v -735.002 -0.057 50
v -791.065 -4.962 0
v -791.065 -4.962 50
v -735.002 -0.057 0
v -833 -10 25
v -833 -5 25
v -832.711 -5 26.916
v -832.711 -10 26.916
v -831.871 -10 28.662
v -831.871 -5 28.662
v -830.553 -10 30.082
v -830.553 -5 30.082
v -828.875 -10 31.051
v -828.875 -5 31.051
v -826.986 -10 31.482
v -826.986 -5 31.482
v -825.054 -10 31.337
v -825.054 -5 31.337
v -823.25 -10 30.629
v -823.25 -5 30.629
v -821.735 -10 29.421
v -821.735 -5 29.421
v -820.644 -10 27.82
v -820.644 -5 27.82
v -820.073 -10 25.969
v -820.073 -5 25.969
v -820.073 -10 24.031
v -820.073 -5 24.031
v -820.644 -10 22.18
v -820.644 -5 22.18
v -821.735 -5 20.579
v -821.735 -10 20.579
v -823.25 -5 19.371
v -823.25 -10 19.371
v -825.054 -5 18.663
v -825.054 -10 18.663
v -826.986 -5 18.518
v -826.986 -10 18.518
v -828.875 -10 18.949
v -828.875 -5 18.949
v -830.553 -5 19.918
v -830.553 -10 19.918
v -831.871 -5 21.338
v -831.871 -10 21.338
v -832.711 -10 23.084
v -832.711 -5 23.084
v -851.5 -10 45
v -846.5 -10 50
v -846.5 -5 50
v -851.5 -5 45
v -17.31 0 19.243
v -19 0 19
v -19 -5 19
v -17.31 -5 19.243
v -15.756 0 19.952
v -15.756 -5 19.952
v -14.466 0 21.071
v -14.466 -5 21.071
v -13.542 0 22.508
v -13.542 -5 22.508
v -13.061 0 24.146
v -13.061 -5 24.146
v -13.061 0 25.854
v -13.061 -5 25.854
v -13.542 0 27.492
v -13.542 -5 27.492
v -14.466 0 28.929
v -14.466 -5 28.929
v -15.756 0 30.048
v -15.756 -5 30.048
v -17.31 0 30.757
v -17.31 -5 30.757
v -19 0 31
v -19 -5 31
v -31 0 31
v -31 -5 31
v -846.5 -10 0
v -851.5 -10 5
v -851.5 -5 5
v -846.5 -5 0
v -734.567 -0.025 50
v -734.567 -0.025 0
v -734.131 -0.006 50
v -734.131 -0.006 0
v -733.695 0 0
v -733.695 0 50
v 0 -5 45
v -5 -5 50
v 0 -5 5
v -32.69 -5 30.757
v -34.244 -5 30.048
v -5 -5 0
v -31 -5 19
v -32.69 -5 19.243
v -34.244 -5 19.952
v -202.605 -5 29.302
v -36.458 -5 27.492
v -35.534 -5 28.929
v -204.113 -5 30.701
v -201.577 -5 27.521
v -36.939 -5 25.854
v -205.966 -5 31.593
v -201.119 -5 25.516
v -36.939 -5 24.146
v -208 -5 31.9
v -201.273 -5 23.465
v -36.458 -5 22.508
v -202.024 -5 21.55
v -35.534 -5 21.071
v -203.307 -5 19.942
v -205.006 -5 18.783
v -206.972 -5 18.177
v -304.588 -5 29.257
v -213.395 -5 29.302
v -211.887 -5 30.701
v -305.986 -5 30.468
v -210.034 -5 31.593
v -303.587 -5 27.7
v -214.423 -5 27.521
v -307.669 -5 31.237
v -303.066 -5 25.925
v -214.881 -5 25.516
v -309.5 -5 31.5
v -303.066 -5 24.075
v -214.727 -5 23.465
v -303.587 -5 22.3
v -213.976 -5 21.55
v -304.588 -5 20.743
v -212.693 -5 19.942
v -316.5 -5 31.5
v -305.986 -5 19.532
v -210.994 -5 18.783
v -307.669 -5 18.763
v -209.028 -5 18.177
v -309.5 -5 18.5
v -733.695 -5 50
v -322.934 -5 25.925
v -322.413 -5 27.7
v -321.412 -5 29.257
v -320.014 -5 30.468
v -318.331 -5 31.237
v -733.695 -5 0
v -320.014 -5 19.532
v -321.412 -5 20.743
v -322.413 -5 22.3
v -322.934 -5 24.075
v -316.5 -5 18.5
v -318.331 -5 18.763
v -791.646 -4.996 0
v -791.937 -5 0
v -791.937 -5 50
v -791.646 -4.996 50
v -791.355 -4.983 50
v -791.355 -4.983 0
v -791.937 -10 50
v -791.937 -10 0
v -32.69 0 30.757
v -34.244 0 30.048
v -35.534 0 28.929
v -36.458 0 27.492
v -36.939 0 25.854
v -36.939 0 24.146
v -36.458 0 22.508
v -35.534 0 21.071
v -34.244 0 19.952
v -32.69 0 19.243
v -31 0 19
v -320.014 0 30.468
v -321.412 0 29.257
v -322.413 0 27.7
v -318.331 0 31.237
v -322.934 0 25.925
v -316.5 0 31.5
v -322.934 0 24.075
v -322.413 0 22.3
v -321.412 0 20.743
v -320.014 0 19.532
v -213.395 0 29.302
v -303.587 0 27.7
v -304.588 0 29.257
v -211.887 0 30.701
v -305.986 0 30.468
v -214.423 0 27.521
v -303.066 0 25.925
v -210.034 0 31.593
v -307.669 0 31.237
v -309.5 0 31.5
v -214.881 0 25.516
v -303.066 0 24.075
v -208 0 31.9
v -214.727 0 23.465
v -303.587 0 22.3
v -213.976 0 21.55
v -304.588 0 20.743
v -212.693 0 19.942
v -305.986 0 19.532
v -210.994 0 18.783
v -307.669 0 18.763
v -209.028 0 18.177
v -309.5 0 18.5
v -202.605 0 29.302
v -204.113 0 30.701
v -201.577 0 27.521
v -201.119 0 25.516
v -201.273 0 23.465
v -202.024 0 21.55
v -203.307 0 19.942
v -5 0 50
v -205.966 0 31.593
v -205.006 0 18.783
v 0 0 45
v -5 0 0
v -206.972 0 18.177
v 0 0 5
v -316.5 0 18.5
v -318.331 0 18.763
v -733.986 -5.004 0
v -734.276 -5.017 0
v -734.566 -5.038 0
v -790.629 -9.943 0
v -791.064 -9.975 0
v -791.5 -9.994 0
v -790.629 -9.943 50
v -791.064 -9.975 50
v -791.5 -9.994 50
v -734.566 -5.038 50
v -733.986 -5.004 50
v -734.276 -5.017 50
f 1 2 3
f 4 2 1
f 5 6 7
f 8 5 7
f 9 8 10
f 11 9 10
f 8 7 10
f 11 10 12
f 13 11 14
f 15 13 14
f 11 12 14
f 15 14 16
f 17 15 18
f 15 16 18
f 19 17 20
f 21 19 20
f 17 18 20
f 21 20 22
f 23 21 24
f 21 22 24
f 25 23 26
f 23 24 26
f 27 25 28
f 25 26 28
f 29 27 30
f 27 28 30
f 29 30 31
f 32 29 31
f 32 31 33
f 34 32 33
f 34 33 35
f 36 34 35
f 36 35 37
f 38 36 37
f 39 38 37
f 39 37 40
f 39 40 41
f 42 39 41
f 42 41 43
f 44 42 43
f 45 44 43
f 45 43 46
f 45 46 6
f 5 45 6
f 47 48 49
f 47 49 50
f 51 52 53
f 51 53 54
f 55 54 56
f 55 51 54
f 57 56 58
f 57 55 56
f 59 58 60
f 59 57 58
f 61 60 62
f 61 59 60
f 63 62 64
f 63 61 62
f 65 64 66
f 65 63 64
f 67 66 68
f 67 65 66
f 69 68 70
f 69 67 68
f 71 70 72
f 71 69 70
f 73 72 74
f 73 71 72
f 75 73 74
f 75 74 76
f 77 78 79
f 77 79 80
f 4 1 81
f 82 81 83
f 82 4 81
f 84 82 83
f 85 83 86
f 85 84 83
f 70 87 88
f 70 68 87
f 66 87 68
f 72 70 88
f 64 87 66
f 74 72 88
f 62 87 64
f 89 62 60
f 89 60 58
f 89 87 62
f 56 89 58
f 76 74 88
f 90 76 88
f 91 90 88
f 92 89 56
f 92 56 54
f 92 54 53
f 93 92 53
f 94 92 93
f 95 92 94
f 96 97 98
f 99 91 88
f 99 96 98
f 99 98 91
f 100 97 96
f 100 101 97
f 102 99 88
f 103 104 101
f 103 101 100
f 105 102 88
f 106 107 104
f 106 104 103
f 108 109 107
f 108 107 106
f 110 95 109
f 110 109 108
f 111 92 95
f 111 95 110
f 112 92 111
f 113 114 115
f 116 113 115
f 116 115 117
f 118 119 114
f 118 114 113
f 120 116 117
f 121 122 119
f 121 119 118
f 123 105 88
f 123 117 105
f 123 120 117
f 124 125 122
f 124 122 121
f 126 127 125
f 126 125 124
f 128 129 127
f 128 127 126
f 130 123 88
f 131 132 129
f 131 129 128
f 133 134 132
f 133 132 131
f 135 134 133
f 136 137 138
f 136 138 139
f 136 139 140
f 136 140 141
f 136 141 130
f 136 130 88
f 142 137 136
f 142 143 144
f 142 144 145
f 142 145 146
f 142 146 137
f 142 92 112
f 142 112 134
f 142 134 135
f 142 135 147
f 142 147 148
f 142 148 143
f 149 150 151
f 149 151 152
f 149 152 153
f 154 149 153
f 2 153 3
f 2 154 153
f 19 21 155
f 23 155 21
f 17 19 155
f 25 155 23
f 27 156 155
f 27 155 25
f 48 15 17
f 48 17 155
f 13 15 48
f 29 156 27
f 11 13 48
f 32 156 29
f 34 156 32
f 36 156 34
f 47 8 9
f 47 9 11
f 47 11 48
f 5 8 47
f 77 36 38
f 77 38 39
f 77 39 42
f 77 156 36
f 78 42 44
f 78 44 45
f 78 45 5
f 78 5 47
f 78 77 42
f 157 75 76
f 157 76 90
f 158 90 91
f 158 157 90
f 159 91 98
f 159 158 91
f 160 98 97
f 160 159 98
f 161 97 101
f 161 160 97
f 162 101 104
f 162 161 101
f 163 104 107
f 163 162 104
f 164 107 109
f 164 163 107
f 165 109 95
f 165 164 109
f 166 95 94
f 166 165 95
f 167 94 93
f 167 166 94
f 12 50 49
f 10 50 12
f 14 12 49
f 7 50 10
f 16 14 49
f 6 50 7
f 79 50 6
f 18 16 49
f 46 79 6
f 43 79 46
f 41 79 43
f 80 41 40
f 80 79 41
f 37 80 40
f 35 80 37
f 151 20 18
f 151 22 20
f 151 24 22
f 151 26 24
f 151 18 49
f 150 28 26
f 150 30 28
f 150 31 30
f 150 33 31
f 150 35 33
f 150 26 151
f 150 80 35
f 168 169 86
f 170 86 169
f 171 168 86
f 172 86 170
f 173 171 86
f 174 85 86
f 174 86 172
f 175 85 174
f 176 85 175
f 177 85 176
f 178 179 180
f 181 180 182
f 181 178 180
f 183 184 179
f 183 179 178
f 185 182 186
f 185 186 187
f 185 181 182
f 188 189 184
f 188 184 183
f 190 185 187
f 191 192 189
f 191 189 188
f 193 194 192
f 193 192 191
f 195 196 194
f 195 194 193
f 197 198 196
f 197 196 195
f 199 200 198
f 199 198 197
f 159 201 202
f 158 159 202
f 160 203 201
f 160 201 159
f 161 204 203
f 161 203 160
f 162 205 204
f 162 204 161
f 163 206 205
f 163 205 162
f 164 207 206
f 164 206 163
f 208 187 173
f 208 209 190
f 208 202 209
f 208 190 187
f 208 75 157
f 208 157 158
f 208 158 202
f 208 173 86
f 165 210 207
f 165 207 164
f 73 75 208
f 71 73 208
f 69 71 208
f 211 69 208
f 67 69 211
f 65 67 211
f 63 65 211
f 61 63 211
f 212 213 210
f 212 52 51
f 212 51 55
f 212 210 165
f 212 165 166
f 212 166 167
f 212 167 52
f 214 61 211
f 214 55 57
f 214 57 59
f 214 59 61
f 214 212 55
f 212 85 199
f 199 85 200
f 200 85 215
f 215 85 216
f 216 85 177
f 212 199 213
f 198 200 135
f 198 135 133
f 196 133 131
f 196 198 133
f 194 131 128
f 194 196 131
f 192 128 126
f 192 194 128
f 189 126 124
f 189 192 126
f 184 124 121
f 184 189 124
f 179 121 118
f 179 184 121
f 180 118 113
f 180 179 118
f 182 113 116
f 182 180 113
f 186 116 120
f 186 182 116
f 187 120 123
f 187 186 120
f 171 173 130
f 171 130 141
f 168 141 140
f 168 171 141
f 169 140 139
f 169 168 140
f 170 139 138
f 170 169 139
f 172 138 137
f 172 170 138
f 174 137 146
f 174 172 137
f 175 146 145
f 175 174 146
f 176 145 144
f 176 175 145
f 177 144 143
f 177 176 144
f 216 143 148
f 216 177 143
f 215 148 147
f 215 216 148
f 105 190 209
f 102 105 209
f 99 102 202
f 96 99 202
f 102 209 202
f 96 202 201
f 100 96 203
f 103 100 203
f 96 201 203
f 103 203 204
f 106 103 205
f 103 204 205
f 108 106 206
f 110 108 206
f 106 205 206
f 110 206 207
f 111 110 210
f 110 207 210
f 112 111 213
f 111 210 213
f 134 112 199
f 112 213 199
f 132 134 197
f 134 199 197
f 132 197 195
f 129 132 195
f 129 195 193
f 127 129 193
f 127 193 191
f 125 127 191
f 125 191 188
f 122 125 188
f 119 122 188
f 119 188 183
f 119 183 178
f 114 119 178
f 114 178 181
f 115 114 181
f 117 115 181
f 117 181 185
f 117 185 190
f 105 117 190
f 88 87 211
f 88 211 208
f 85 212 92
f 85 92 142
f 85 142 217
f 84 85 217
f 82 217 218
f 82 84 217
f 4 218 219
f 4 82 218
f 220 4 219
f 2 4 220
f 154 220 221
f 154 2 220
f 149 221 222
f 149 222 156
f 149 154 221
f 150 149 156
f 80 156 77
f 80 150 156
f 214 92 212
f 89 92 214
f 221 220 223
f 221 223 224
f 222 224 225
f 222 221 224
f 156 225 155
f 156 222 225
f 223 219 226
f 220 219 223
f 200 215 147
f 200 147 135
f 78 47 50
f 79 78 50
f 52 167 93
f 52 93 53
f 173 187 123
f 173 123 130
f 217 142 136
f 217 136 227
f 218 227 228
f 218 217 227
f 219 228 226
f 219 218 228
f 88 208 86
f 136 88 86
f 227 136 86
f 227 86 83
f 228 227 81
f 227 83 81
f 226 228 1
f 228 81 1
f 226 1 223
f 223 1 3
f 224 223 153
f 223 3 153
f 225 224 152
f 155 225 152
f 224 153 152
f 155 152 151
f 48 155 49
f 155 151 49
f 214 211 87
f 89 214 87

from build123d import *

# Parameters (mm, degrees)
SM_BASE_FLANGE_1_DEPTH = 50
SKETCH_4_R             = 6.9
CUT_EXTRUDE_3_DEPTH    = 10
SKETCH_5_R             = 6.5
CUT_EXTRUDE_4_DEPTH    = 10
OTHER_START            = -10
OTHER_1_DEPTH          = 10
CUT_EXTRUDE_5_DEPTH    = 10


# Read off the part's stored shape, not the designer's step: Затупленный угол1
# Sheet-metal steps are written as plain solids
with BuildPart() as part:
    # Sketch 1 → Базовая кромка1 (new body)
    with BuildSketch(Plane.XY):
        with BuildLine():
            Line((-851.5, -5), (-791.936609429, -5))
            ThreePointArc((-791.936609429, -5), (-791.500415555, -4.990482216), (-791.065052002, -4.961946981))
            Line((-791.065052002, -4.961946981), (-735.002160484, -0.057079529))
            ThreePointArc((-735.002160484, -0.057079529), (-734.349115153, -0.014276676), (-733.694824343, 0))
            Line((-733.694824343, 0), (0, 0))
            Line((0, 0), (0, -5))
            Line((0, -5), (-733.694824343, -5))
            ThreePointArc((-733.694824343, -5), (-734.131018216, -5.009517784), (-734.56638177, -5.038053019))
            Line((-734.56638177, -5.038053019), (-790.629273288, -9.942920471))
            ThreePointArc((-790.629273288, -9.942920471), (-791.282318619, -9.985723324), (-791.936609429, -10))
            Line((-791.936609429, -10), (-851.5, -10))
            Line((-851.5, -10), (-851.5, -5))
        make_face()
    extrude(amount=SM_BASE_FLANGE_1_DEPTH)

    # Эскиз4 → Вырез-Вытянуть3 (cut)
    with BuildSketch(Plane(origin=(0, 0, 0), x_dir=(1, 0, 0), z_dir=(0, 1, 0))):
        with Locations(Location((-208, -25, 0), (0, 0, 270))):
            Circle(SKETCH_4_R)
        with BuildLine():
            Line((-309.5, -31.5), (-316.5, -31.5))
            ThreePointArc((-316.5, -31.5), (-323, -25), (-316.5, -18.5))
            Line((-316.5, -18.5), (-309.5, -18.5))
            ThreePointArc((-309.5, -18.5), (-303, -25), (-309.5, -31.5))
        make_face()
    extrude(amount=-CUT_EXTRUDE_3_DEPTH, mode=Mode.SUBTRACT)

    # Эскиз5 → Вырез-Вытянуть4 (cut)
    with BuildSketch(Plane(origin=(0, -5, 0), x_dir=(1, 0, 0), z_dir=(0, 1, 0))):
        with Locations(Location((-826.5, -25, 0), (0, 0, 180))):
            Circle(SKETCH_5_R)
    extrude(amount=-CUT_EXTRUDE_4_DEPTH, mode=Mode.SUBTRACT)

    # Other 1 outline → Other 1 (cut)
    with BuildSketch(Plane(origin=(0, 0, 0), x_dir=(1, 0, 0), z_dir=(0, 1, 0)).offset(OTHER_START)):
        Polygon((0, 0), (-5, 0), (0, -5), align=None)
        Polygon((0, -50), (0, -45), (-5, -50), align=None)
        Polygon((-851.5, 0), (-851.5, -5), (-846.5, 0), align=None)
        Polygon((-846.5, -50), (-851.5, -45), (-851.5, -50), align=None)
    extrude(amount=OTHER_1_DEPTH, mode=Mode.SUBTRACT)

    # Эскиз6 → Вырез-Вытянуть5 (cut)
    with BuildSketch(Plane(origin=(0, 0, 0), x_dir=(1, 0, 0), z_dir=(0, 1, 0))):
        with BuildLine():
            Line((-19, -31), (-31, -31))
            ThreePointArc((-31, -31), (-37, -25), (-31, -19))
            Line((-31, -19), (-19, -19))
            ThreePointArc((-19, -19), (-13, -25), (-19, -31))
        make_face()
    extrude(amount=-CUT_EXTRUDE_5_DEPTH, mode=Mode.SUBTRACT)


solid = part.part
